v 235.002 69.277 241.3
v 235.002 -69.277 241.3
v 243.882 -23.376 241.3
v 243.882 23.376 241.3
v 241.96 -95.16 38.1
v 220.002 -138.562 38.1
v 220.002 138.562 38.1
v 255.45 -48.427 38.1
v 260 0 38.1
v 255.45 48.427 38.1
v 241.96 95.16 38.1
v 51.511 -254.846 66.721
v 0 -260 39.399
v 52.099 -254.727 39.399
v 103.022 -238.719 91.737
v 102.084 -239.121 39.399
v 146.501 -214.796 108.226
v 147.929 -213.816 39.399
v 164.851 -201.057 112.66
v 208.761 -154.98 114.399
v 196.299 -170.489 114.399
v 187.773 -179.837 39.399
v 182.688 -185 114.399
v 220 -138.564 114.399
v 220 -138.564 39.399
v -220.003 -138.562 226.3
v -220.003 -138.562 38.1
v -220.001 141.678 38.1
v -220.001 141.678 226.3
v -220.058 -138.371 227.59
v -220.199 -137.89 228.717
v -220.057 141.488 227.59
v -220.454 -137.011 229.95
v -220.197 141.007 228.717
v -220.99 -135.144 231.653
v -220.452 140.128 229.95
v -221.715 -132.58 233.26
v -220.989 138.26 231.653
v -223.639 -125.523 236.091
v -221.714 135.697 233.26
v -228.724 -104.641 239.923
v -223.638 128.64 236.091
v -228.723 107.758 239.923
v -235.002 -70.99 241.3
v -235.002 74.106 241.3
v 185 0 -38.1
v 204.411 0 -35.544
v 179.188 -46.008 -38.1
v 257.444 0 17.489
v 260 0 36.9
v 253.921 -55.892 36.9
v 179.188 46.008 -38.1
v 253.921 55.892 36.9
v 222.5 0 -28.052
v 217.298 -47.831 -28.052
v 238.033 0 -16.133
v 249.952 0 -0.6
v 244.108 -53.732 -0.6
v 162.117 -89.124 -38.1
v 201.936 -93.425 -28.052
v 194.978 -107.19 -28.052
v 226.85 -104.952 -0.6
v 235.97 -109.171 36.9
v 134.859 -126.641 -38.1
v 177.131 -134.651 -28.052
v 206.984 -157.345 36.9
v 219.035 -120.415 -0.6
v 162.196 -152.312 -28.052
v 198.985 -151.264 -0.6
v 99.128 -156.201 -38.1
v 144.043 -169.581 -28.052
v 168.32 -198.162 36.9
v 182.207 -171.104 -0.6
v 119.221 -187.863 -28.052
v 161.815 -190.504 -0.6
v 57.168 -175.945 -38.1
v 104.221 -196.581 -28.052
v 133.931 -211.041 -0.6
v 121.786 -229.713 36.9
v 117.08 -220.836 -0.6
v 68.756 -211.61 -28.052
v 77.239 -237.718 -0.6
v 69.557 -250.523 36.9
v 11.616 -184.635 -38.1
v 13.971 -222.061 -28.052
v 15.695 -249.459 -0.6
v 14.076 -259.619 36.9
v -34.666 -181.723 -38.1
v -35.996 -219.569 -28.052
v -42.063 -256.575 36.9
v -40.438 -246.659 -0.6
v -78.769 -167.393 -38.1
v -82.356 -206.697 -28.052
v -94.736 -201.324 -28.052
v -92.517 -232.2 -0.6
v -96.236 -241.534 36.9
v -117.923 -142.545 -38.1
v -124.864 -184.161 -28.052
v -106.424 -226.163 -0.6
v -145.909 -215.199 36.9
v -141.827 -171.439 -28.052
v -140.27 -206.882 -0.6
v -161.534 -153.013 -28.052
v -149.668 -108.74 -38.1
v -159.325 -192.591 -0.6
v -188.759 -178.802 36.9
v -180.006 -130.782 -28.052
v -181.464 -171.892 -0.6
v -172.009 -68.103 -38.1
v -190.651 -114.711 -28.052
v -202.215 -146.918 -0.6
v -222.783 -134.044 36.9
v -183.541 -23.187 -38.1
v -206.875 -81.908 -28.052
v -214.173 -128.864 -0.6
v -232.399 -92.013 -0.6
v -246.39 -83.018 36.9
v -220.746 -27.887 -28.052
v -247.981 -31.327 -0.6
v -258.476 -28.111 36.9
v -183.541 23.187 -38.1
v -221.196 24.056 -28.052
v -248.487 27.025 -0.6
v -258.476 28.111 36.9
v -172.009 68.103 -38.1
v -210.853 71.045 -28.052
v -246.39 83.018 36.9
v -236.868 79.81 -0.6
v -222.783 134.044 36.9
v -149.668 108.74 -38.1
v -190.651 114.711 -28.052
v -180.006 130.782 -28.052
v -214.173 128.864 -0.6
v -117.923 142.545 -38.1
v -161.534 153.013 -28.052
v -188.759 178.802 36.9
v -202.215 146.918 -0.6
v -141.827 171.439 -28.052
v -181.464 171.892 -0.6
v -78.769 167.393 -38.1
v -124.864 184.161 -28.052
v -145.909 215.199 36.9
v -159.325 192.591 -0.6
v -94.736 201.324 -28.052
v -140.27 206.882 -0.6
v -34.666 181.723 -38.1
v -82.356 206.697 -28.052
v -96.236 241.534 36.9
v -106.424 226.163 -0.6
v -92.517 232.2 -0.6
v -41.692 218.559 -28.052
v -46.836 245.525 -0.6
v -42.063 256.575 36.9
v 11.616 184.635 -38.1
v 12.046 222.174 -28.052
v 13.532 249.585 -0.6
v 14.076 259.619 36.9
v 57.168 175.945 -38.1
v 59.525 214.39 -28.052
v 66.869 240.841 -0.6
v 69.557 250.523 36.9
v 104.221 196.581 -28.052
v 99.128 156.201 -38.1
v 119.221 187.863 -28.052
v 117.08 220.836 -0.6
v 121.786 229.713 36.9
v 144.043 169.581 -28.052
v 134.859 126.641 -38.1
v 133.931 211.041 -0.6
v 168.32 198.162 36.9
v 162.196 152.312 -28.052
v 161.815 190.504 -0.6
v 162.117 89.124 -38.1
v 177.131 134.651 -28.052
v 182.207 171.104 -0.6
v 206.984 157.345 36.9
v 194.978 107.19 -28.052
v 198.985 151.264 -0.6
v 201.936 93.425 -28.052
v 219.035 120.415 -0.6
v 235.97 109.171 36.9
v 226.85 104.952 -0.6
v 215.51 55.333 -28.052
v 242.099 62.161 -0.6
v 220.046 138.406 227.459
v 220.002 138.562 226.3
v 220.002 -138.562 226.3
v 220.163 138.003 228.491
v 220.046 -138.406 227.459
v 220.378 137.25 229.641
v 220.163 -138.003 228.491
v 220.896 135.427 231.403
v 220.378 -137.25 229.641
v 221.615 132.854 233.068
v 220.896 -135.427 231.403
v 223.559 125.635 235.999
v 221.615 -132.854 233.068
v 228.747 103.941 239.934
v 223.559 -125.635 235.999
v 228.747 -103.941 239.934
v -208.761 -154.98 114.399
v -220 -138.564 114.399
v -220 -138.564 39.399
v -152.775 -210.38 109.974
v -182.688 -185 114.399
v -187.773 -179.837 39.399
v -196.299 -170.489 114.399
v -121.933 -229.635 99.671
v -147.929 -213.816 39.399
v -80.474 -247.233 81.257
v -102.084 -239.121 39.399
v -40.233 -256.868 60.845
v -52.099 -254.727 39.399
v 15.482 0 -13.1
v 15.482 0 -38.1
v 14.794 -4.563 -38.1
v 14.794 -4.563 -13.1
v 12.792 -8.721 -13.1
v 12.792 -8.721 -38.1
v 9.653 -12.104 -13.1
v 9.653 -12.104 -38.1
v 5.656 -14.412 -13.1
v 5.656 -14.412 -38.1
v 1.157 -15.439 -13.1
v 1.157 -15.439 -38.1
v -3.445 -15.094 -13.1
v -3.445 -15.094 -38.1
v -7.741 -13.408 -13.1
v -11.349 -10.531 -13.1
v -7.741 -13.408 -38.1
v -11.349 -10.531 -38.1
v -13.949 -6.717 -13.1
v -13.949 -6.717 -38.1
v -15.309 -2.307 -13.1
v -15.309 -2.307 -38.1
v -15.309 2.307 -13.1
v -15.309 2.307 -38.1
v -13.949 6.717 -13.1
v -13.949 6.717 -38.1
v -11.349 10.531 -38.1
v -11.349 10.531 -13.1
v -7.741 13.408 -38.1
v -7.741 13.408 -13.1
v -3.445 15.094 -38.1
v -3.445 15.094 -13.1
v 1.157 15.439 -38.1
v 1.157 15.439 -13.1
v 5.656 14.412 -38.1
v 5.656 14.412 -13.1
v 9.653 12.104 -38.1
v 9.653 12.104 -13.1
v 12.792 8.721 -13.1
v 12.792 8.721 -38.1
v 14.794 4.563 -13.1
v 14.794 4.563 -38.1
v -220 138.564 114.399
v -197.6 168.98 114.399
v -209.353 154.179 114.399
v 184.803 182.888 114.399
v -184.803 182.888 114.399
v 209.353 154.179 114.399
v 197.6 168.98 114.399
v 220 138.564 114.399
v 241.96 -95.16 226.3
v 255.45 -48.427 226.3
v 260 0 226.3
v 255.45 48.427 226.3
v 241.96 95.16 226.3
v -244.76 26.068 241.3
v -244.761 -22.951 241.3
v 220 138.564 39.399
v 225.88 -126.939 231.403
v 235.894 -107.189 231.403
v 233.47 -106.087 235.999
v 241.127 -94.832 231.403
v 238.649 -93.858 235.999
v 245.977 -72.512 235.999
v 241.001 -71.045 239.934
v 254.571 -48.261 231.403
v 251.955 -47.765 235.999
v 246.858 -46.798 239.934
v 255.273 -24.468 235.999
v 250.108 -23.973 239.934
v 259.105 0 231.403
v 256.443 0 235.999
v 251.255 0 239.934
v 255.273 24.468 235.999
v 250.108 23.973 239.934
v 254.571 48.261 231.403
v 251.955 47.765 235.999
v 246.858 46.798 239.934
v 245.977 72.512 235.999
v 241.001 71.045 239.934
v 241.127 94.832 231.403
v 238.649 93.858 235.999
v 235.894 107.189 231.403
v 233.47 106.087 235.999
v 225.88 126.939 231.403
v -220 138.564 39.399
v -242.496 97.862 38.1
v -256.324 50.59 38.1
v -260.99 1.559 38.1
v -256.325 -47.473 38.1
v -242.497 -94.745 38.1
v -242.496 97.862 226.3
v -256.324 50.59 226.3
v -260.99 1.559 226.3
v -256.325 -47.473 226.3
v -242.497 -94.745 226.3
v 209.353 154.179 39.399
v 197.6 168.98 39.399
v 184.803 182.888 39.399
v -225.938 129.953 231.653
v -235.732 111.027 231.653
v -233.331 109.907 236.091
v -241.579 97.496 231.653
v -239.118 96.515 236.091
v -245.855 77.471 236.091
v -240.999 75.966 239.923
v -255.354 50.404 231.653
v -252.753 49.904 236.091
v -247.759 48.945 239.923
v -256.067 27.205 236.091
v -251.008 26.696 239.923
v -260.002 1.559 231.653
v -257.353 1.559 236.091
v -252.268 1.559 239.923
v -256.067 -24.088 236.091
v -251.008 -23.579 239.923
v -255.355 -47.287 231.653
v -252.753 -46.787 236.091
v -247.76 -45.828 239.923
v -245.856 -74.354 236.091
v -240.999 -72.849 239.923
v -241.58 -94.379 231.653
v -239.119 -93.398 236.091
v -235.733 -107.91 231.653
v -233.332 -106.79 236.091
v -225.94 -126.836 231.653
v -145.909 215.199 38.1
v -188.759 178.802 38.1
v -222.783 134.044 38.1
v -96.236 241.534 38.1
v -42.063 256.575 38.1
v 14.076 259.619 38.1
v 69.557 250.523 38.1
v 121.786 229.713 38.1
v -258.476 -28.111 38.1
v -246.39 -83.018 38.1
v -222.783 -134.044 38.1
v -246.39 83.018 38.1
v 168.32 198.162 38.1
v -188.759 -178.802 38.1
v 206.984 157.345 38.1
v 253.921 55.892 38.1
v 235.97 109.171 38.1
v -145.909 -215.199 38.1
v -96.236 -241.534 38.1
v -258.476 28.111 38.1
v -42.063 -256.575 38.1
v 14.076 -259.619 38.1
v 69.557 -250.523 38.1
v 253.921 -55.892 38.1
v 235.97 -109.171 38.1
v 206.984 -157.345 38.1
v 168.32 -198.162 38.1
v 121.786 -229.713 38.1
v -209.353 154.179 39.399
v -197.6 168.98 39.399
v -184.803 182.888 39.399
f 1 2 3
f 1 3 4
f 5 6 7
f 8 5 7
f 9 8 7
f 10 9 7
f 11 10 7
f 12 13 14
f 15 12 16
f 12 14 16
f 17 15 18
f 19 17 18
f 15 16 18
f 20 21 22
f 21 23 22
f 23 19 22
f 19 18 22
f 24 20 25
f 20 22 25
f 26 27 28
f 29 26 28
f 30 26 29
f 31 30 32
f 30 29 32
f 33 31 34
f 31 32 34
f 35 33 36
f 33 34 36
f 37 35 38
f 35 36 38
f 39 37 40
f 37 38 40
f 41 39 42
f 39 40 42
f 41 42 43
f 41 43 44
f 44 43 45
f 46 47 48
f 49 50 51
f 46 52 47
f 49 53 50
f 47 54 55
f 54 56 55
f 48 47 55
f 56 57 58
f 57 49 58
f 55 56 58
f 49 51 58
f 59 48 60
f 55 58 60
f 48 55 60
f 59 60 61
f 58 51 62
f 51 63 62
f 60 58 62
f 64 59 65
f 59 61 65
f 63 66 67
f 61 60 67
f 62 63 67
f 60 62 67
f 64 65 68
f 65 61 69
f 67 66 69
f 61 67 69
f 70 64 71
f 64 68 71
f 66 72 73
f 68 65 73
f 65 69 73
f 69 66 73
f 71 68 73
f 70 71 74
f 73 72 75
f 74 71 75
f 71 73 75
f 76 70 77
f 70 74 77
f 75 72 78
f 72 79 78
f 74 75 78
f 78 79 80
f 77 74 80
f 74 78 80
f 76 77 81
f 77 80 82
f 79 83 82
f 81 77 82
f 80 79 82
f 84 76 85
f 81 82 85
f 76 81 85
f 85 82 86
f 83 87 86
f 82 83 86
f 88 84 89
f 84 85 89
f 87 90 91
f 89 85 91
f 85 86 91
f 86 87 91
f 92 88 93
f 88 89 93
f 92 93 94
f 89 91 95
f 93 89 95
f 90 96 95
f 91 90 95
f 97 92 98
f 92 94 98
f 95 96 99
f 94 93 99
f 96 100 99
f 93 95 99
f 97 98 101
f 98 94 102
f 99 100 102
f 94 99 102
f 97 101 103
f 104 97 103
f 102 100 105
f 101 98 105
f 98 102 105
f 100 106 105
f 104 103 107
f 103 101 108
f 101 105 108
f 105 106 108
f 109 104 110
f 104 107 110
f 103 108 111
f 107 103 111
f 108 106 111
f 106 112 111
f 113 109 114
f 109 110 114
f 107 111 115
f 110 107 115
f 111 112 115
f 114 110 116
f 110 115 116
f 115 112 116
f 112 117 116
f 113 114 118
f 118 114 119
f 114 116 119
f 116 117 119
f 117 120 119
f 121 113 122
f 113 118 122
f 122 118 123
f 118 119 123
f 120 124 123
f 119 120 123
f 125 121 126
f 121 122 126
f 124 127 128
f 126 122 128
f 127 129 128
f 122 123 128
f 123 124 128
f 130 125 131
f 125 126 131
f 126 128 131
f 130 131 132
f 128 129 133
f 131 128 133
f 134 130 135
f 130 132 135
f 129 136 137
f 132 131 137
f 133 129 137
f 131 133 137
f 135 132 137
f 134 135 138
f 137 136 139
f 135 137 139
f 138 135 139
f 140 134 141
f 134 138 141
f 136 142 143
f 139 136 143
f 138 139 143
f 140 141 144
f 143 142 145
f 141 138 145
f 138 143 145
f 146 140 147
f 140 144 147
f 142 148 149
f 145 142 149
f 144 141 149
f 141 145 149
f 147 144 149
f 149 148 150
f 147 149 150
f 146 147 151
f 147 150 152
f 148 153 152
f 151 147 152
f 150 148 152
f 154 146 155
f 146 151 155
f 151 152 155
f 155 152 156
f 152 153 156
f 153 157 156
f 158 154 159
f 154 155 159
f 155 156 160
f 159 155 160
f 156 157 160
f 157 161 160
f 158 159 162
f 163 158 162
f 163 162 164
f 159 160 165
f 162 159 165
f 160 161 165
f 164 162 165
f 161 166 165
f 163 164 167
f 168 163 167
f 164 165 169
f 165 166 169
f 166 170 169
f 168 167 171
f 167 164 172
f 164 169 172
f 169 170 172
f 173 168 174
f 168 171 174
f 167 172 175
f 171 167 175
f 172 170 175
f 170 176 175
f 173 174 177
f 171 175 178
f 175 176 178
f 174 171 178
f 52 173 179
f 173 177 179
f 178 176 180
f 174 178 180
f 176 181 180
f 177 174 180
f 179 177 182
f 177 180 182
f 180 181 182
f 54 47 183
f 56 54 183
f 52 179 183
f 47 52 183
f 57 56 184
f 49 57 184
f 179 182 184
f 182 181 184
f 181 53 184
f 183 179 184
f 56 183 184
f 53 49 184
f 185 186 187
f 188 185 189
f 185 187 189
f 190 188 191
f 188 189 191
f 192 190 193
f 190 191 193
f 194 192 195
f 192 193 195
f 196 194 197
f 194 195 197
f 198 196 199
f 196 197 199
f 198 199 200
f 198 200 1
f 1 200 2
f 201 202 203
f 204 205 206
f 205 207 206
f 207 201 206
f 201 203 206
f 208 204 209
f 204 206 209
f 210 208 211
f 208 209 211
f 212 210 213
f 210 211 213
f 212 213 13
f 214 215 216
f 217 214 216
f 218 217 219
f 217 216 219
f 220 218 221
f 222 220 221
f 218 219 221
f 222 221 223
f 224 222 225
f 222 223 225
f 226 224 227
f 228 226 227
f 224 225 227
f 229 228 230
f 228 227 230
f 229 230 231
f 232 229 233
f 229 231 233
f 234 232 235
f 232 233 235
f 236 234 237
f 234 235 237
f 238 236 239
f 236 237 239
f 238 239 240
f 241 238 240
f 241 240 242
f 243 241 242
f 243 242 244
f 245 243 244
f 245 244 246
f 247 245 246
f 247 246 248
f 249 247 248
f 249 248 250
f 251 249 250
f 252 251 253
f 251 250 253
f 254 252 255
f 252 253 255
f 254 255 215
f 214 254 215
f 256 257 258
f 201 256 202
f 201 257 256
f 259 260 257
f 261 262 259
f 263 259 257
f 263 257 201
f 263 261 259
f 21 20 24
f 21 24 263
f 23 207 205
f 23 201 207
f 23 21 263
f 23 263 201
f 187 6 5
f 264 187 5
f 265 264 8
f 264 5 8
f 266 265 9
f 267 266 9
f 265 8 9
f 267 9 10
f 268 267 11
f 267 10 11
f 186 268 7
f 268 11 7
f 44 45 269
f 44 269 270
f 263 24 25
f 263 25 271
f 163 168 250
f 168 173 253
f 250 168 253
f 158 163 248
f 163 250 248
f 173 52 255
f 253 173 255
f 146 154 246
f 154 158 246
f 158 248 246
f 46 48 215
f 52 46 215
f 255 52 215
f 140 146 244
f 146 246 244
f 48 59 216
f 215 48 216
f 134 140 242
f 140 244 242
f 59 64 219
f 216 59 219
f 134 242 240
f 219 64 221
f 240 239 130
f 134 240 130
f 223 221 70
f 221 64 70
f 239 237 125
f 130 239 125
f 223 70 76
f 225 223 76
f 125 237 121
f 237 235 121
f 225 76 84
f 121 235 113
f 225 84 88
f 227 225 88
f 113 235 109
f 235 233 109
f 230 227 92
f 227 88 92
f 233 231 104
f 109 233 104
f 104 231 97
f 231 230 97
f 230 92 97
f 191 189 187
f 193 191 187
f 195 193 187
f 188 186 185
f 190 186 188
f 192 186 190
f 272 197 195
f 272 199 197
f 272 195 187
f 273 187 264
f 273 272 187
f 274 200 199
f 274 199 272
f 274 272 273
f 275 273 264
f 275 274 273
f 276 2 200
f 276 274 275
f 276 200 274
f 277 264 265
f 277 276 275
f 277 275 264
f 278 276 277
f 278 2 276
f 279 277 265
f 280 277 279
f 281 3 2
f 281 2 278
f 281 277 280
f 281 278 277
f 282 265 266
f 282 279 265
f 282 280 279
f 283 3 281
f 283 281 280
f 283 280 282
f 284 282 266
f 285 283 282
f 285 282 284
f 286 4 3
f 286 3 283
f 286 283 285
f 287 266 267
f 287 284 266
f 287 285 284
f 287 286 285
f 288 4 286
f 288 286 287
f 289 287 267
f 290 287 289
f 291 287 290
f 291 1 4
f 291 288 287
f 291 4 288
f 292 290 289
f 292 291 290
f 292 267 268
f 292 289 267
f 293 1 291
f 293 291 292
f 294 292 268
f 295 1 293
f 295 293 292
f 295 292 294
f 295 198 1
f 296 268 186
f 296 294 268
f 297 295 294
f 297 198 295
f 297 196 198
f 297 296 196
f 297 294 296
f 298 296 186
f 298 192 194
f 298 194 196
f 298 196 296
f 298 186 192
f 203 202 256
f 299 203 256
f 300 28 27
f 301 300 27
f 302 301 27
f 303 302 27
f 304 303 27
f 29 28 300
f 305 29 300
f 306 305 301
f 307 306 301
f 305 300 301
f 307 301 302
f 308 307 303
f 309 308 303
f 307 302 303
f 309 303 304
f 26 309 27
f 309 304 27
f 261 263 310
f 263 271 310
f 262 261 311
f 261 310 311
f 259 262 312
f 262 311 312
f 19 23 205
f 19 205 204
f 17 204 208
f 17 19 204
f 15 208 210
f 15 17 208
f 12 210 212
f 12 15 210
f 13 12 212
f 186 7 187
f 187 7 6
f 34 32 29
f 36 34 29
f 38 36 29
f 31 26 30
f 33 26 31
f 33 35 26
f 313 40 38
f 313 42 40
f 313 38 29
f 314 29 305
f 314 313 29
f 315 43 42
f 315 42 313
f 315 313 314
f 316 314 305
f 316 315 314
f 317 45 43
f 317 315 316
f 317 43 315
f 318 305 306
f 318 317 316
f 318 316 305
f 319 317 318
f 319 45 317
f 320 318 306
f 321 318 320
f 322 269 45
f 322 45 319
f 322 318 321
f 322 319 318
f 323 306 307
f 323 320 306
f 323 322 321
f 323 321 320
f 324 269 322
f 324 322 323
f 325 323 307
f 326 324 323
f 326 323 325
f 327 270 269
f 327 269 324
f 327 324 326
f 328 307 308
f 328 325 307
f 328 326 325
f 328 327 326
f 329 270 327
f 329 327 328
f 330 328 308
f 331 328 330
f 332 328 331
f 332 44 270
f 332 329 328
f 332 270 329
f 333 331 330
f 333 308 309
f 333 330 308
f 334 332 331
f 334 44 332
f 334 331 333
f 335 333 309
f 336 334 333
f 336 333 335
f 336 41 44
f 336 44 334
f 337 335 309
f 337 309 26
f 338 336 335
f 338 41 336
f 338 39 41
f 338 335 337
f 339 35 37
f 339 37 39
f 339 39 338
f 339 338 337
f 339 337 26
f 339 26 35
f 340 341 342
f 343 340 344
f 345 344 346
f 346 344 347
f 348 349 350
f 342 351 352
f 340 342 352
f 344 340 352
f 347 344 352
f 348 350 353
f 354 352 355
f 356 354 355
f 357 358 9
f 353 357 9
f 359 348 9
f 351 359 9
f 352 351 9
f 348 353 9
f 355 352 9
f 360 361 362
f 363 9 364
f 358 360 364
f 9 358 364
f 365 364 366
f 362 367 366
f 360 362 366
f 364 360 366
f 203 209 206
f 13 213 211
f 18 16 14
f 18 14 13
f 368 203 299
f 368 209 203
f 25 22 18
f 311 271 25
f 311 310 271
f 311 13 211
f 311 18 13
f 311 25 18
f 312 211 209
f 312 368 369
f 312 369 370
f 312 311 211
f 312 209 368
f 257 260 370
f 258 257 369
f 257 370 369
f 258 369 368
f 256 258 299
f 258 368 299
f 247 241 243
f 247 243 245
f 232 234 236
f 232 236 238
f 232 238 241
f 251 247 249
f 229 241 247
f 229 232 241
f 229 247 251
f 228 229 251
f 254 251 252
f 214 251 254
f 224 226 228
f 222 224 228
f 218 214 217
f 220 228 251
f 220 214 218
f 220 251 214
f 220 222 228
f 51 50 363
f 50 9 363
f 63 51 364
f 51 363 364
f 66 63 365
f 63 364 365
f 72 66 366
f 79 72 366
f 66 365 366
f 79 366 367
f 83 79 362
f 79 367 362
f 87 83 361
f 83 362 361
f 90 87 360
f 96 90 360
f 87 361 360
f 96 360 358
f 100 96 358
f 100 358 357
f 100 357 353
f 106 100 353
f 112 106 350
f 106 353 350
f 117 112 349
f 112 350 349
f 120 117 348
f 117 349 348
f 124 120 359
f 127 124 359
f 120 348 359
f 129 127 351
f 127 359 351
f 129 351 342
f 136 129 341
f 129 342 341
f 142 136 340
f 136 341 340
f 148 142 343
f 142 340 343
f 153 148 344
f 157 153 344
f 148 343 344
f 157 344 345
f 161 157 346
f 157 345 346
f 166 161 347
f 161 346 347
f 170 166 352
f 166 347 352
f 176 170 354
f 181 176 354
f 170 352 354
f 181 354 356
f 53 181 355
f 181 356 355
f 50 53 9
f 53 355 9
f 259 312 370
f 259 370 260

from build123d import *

# Parameters (mm, degrees)
F3_DEPTH  = 220
F4_R      = 500
F4_R_2    = 260
F5_DEPTH  = 500
F7_DEPTH  = 203.2
F8_R      = 15
F9_R      = 15
F10_R     = 15.4821269872
F11_DEPTH = 25
F12_DEPTH = 25
F13_W     = 88.8012498617
F13_H     = 75.206540525
F14_DEPTH = 450


with BuildPart() as f1:
    # F0 (on Front) → F1 (revolve)
    with BuildSketch(Plane.XZ):
        with BuildLine():
            Line((260, 36.9), (260, 38.1))
            Line((260, 38.1), (0, 38.1))
            Line((0, 38.1), (0, -38.1))
            Line((0, -38.1), (185, -38.1))
            ThreePointArc((185, -38.1), (238.033008589, -16.133008589), (260, 36.9))
        make_face()
    revolve(axis=Axis((0, 0, 0), (0, 0, -1)))

    # F10 (on face) → F11 (cut)
    with BuildSketch(Plane(origin=(0, 0, -38.1), x_dir=(1, 0, 0), z_dir=(0, 0, -1))):
        Circle(F10_R)
    extrude(amount=-F11_DEPTH, mode=Mode.SUBTRACT)

    # F10 (on face) → F12 (cut)
    with BuildSketch(Plane(origin=(0, 0, -38.1), x_dir=(1, 0, 0), z_dir=(0, 0, -1))):
        Circle(F10_R)
    extrude(amount=-F12_DEPTH, mode=Mode.SUBTRACT)


with BuildPart() as f3:
    # F2 (on Right) → F3 (new body, symmetric)
    with BuildSketch(Plane.YZ):
        with BuildLine():
            Line((185, 114.3989069283), (0, 114.3989069283))
            Line((0, 114.3989069283), (-185, 114.3989069283))
            ThreePointArc((-185, 114.3989069283), (-238.033008589, 92.4319155173), (-260, 39.3989069283))
            Line((-260, 39.3989069283), (260, 39.3989069283))
            ThreePointArc((260, 39.3989069283), (238.033008589, 92.4319155173), (185, 114.3989069283))
        make_face()
    extrude(amount=F3_DEPTH, both=True)

    # F4 (on Top) → F5 (cut)
    with BuildSketch(Plane.XY):
        Circle(F4_R)
        Circle(F4_R_2, mode=Mode.SUBTRACT)
    extrude(amount=F5_DEPTH, mode=Mode.SUBTRACT)

    # F13 (on Right) → F14 (cut, symmetric)
    with BuildSketch(Plane.YZ):
        with Locations((227.28831321, 76.8649913371)):
            Rectangle(F13_W, F13_H)
    extrude(amount=F14_DEPTH, both=True, mode=Mode.SUBTRACT)


with BuildPart() as f7:
    # F6 (on face) → F7 (new body)
    with BuildSketch(Plane.XY.offset(38.1)):
        with BuildLine():
            Line((220.0015857845, 138.5615468025), (220.0015857845, -138.5615468025))
            ThreePointArc((220.0015857845, -138.5615468025), (260, 0), (220.0015857845, 138.5615468025))
        make_face()
    extrude(amount=F7_DEPTH)

    # F8
    f8_edges = [f7.edges().sort_by_distance(p)[0] for p in [
        (220.001586, 0, 241.3),
        (260, 0, 241.3),
    ]]
    fillet(f8_edges, radius=F8_R)


with BuildPart() as f7b:
    # F6 (on face) → F7, piece 2 (new body)
    with BuildSketch(Plane.XY.offset(38.1)):
        with BuildLine():
            Line((-220.0025767088, -138.5615468025), (-220.0012808488, 141.6782819457))
            ThreePointArc((-220.0012808488, 141.6782819457), (-260.9895784522, 1.558557103), (-220.0025767088, -138.5615468025))
        make_face()
    extrude(amount=F7_DEPTH)

    # F9
    f9_edges = [f7b.edges().sort_by_distance(p)[0] for p in [
        (-260.989578, 1.558557, 241.3),
        (-220.001929, 1.558368, 241.3),
    ]]
    fillet(f9_edges, radius=F9_R)


solid = Compound([f1.part, f3.part, f7.part, f7b.part])
